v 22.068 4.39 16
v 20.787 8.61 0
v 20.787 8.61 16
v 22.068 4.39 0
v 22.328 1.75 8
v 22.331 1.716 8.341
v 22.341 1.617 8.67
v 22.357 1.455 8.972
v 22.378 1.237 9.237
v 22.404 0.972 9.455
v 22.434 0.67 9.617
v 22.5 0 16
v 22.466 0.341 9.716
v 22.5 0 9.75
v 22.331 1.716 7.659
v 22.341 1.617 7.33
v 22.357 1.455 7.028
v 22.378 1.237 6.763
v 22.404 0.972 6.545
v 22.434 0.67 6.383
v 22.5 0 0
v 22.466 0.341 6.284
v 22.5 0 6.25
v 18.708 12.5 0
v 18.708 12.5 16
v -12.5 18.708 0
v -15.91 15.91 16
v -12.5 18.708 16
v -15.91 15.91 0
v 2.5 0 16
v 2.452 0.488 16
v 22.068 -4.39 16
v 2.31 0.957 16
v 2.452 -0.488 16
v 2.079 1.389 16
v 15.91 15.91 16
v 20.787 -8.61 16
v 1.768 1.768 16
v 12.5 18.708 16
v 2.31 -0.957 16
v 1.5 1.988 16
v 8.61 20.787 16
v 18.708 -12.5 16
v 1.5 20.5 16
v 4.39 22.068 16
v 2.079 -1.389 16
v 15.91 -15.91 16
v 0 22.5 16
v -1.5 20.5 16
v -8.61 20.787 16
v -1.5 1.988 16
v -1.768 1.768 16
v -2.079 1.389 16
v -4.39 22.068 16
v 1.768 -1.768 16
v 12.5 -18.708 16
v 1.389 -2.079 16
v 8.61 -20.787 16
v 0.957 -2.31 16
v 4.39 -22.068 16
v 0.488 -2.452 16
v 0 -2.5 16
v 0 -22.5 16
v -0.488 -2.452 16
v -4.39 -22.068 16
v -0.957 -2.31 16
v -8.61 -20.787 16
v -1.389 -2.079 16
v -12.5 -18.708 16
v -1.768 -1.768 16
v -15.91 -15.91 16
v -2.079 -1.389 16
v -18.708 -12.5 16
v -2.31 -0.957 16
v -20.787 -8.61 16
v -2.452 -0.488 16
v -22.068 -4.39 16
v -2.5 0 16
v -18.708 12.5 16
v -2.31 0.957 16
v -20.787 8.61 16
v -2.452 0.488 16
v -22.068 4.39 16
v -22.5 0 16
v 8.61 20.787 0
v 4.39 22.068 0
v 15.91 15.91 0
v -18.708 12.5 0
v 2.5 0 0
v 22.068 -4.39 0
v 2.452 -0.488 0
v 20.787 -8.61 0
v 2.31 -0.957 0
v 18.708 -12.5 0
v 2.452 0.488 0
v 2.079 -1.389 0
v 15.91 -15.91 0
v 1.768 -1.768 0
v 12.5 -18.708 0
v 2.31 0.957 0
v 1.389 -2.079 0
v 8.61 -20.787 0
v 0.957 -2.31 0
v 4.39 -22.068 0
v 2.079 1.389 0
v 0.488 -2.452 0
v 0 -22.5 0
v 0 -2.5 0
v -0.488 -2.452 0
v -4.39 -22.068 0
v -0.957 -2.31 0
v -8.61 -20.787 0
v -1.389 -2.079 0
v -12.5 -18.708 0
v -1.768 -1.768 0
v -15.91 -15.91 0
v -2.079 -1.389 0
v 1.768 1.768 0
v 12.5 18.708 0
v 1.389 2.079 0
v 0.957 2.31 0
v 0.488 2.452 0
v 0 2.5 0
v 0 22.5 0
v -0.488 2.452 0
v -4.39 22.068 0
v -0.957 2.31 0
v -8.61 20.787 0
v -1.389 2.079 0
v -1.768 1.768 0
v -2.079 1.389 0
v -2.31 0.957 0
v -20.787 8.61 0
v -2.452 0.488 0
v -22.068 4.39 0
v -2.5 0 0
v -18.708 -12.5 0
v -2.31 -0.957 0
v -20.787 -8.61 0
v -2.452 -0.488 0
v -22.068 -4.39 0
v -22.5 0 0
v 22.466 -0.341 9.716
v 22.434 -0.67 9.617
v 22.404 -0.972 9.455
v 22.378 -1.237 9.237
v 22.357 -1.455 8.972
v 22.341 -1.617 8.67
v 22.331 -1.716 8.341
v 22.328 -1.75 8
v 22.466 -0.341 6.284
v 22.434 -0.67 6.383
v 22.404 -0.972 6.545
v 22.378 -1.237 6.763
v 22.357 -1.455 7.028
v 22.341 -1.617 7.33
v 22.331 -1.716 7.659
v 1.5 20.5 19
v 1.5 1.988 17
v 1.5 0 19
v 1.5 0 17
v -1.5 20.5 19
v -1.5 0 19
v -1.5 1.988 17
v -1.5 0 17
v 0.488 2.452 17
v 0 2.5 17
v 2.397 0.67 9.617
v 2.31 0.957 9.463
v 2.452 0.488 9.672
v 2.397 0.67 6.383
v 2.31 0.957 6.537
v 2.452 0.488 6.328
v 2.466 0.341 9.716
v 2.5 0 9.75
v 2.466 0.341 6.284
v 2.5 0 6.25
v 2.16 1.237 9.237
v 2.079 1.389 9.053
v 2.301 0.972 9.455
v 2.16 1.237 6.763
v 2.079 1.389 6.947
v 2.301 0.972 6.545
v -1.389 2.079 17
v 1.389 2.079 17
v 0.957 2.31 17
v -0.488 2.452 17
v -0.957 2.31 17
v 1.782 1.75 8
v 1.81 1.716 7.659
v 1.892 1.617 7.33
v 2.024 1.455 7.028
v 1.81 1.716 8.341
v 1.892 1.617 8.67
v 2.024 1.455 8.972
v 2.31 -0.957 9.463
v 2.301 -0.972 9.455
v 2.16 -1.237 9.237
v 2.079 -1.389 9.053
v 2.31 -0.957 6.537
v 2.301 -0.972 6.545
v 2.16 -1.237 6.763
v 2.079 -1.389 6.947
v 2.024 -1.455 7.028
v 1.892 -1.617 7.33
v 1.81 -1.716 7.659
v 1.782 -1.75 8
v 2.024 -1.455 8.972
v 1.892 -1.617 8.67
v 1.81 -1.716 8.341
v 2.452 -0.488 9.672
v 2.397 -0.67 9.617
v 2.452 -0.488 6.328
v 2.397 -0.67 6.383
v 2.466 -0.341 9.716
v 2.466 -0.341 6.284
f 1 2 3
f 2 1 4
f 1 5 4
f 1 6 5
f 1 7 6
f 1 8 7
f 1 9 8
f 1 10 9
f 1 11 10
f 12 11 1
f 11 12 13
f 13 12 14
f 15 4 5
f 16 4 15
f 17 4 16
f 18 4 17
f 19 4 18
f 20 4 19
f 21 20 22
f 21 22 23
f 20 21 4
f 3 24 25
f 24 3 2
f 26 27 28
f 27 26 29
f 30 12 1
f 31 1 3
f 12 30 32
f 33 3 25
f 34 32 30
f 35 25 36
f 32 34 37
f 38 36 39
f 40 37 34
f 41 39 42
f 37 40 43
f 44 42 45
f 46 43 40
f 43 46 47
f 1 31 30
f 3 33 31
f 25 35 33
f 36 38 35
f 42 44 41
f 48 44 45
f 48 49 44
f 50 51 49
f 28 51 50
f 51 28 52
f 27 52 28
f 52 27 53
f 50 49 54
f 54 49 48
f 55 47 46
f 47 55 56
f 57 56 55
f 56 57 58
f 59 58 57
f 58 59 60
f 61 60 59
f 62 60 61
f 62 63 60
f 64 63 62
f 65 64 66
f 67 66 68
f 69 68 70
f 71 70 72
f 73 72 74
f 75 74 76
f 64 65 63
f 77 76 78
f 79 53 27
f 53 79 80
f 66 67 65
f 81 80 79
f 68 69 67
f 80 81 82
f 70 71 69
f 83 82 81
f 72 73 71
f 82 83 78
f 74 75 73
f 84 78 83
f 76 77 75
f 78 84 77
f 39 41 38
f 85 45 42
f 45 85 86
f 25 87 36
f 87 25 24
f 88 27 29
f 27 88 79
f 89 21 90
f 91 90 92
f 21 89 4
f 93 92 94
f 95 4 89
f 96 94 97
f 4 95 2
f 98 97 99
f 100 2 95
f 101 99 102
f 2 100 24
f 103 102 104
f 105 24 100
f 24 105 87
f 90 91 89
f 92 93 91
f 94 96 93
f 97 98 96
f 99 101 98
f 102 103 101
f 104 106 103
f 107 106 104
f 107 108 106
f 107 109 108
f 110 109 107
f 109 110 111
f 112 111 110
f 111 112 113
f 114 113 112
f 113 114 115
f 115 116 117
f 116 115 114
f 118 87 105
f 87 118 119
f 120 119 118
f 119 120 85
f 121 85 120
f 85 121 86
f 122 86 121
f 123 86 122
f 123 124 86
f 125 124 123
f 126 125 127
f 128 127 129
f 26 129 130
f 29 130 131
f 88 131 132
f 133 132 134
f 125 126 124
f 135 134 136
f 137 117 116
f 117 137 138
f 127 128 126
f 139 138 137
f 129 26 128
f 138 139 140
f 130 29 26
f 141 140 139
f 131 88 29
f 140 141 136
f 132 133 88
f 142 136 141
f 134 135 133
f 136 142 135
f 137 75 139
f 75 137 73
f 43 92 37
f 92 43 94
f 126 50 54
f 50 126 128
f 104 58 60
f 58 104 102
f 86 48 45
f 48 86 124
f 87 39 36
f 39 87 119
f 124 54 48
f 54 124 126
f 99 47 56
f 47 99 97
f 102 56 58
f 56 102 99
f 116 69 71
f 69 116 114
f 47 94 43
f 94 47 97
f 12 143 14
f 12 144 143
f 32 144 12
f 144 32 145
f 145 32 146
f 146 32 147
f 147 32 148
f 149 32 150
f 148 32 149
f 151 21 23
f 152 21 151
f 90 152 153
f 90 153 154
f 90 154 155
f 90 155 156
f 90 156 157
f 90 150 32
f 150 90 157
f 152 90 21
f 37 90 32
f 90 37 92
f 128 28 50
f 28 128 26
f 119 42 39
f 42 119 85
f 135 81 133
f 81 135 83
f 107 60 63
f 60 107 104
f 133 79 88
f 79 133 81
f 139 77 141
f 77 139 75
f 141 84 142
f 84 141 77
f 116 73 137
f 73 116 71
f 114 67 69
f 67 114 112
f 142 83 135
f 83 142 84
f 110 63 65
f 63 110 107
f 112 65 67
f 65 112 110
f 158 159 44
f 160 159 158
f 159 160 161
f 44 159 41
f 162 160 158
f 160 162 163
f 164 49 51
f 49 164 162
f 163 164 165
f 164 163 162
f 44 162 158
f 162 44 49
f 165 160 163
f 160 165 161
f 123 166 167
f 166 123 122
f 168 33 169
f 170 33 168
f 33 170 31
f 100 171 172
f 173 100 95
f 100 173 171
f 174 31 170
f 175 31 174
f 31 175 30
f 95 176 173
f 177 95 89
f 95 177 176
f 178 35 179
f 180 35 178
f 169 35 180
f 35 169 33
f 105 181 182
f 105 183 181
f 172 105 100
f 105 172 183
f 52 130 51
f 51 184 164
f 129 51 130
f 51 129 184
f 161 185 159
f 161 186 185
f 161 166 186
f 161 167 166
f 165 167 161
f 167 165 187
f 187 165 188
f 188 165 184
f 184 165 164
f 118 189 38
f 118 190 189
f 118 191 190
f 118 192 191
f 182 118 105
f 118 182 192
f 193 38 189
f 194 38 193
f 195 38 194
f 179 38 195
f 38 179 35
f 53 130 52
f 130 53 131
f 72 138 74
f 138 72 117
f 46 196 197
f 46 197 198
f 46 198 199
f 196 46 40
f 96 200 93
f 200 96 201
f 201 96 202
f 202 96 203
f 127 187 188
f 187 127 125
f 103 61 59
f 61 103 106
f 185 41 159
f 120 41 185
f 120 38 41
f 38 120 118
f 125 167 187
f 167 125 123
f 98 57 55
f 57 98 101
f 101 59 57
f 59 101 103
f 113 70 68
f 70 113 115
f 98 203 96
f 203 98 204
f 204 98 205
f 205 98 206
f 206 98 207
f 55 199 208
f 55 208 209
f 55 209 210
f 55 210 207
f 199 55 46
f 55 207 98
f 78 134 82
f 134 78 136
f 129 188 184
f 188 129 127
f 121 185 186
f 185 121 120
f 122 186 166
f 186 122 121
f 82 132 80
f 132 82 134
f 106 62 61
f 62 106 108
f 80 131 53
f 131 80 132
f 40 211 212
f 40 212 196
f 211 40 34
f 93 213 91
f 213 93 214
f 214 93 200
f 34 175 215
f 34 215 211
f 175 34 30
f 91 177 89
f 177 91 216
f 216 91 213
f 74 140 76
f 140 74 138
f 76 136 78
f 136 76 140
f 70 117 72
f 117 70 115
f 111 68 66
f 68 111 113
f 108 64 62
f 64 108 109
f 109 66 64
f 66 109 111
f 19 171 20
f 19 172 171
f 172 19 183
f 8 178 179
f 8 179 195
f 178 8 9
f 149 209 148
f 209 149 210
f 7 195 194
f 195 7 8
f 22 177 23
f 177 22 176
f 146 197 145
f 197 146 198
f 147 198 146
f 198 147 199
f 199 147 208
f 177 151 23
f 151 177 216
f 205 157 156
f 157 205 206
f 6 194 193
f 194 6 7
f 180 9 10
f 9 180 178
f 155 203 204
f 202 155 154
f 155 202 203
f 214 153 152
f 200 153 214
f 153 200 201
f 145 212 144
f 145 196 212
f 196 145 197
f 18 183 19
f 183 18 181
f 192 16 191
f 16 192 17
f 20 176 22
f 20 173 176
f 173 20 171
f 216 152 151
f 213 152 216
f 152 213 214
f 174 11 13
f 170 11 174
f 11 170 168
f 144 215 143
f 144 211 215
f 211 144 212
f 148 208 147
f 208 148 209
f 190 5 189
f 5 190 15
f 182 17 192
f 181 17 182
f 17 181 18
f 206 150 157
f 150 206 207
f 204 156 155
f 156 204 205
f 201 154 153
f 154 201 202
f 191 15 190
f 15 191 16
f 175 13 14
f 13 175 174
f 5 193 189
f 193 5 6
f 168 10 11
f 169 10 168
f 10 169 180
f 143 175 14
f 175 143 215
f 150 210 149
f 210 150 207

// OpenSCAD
$fn = 32;

// ----------------------------------------------------------------------
// Control knob: pointer knob
// ----------------------------------------------------------------------

// --- parameters (mm) ---
rib_w = 3;                // pointer rib width
rib_h = 4;                // pointer rib height
knob_d = 45;              // knob body diameter
knob_h = 16;              // knob body height
bore_d = 5;               // shaft bore diameter
set_d = 3.5;              // set screw bore diameter

rib_poke = rib_h - 1;  // rib height above the top
total_h = knob_h + rib_h - 1;  // overall height

difference() {
  union() {
    cylinder(h = knob_h, d = knob_d);
    translate([-rib_w / 2, 0, knob_h - 1])
      cube([rib_w, knob_d / 2 - 2, rib_h]);
  }
  translate([0, 0, -1]) cylinder(h = knob_h + 2, d = bore_d);
  translate([-1, 0, knob_h / 2]) rotate([0, 90, 0])
    cylinder(h = knob_d / 2 + bore_d / 2 + 2, d = set_d);}
